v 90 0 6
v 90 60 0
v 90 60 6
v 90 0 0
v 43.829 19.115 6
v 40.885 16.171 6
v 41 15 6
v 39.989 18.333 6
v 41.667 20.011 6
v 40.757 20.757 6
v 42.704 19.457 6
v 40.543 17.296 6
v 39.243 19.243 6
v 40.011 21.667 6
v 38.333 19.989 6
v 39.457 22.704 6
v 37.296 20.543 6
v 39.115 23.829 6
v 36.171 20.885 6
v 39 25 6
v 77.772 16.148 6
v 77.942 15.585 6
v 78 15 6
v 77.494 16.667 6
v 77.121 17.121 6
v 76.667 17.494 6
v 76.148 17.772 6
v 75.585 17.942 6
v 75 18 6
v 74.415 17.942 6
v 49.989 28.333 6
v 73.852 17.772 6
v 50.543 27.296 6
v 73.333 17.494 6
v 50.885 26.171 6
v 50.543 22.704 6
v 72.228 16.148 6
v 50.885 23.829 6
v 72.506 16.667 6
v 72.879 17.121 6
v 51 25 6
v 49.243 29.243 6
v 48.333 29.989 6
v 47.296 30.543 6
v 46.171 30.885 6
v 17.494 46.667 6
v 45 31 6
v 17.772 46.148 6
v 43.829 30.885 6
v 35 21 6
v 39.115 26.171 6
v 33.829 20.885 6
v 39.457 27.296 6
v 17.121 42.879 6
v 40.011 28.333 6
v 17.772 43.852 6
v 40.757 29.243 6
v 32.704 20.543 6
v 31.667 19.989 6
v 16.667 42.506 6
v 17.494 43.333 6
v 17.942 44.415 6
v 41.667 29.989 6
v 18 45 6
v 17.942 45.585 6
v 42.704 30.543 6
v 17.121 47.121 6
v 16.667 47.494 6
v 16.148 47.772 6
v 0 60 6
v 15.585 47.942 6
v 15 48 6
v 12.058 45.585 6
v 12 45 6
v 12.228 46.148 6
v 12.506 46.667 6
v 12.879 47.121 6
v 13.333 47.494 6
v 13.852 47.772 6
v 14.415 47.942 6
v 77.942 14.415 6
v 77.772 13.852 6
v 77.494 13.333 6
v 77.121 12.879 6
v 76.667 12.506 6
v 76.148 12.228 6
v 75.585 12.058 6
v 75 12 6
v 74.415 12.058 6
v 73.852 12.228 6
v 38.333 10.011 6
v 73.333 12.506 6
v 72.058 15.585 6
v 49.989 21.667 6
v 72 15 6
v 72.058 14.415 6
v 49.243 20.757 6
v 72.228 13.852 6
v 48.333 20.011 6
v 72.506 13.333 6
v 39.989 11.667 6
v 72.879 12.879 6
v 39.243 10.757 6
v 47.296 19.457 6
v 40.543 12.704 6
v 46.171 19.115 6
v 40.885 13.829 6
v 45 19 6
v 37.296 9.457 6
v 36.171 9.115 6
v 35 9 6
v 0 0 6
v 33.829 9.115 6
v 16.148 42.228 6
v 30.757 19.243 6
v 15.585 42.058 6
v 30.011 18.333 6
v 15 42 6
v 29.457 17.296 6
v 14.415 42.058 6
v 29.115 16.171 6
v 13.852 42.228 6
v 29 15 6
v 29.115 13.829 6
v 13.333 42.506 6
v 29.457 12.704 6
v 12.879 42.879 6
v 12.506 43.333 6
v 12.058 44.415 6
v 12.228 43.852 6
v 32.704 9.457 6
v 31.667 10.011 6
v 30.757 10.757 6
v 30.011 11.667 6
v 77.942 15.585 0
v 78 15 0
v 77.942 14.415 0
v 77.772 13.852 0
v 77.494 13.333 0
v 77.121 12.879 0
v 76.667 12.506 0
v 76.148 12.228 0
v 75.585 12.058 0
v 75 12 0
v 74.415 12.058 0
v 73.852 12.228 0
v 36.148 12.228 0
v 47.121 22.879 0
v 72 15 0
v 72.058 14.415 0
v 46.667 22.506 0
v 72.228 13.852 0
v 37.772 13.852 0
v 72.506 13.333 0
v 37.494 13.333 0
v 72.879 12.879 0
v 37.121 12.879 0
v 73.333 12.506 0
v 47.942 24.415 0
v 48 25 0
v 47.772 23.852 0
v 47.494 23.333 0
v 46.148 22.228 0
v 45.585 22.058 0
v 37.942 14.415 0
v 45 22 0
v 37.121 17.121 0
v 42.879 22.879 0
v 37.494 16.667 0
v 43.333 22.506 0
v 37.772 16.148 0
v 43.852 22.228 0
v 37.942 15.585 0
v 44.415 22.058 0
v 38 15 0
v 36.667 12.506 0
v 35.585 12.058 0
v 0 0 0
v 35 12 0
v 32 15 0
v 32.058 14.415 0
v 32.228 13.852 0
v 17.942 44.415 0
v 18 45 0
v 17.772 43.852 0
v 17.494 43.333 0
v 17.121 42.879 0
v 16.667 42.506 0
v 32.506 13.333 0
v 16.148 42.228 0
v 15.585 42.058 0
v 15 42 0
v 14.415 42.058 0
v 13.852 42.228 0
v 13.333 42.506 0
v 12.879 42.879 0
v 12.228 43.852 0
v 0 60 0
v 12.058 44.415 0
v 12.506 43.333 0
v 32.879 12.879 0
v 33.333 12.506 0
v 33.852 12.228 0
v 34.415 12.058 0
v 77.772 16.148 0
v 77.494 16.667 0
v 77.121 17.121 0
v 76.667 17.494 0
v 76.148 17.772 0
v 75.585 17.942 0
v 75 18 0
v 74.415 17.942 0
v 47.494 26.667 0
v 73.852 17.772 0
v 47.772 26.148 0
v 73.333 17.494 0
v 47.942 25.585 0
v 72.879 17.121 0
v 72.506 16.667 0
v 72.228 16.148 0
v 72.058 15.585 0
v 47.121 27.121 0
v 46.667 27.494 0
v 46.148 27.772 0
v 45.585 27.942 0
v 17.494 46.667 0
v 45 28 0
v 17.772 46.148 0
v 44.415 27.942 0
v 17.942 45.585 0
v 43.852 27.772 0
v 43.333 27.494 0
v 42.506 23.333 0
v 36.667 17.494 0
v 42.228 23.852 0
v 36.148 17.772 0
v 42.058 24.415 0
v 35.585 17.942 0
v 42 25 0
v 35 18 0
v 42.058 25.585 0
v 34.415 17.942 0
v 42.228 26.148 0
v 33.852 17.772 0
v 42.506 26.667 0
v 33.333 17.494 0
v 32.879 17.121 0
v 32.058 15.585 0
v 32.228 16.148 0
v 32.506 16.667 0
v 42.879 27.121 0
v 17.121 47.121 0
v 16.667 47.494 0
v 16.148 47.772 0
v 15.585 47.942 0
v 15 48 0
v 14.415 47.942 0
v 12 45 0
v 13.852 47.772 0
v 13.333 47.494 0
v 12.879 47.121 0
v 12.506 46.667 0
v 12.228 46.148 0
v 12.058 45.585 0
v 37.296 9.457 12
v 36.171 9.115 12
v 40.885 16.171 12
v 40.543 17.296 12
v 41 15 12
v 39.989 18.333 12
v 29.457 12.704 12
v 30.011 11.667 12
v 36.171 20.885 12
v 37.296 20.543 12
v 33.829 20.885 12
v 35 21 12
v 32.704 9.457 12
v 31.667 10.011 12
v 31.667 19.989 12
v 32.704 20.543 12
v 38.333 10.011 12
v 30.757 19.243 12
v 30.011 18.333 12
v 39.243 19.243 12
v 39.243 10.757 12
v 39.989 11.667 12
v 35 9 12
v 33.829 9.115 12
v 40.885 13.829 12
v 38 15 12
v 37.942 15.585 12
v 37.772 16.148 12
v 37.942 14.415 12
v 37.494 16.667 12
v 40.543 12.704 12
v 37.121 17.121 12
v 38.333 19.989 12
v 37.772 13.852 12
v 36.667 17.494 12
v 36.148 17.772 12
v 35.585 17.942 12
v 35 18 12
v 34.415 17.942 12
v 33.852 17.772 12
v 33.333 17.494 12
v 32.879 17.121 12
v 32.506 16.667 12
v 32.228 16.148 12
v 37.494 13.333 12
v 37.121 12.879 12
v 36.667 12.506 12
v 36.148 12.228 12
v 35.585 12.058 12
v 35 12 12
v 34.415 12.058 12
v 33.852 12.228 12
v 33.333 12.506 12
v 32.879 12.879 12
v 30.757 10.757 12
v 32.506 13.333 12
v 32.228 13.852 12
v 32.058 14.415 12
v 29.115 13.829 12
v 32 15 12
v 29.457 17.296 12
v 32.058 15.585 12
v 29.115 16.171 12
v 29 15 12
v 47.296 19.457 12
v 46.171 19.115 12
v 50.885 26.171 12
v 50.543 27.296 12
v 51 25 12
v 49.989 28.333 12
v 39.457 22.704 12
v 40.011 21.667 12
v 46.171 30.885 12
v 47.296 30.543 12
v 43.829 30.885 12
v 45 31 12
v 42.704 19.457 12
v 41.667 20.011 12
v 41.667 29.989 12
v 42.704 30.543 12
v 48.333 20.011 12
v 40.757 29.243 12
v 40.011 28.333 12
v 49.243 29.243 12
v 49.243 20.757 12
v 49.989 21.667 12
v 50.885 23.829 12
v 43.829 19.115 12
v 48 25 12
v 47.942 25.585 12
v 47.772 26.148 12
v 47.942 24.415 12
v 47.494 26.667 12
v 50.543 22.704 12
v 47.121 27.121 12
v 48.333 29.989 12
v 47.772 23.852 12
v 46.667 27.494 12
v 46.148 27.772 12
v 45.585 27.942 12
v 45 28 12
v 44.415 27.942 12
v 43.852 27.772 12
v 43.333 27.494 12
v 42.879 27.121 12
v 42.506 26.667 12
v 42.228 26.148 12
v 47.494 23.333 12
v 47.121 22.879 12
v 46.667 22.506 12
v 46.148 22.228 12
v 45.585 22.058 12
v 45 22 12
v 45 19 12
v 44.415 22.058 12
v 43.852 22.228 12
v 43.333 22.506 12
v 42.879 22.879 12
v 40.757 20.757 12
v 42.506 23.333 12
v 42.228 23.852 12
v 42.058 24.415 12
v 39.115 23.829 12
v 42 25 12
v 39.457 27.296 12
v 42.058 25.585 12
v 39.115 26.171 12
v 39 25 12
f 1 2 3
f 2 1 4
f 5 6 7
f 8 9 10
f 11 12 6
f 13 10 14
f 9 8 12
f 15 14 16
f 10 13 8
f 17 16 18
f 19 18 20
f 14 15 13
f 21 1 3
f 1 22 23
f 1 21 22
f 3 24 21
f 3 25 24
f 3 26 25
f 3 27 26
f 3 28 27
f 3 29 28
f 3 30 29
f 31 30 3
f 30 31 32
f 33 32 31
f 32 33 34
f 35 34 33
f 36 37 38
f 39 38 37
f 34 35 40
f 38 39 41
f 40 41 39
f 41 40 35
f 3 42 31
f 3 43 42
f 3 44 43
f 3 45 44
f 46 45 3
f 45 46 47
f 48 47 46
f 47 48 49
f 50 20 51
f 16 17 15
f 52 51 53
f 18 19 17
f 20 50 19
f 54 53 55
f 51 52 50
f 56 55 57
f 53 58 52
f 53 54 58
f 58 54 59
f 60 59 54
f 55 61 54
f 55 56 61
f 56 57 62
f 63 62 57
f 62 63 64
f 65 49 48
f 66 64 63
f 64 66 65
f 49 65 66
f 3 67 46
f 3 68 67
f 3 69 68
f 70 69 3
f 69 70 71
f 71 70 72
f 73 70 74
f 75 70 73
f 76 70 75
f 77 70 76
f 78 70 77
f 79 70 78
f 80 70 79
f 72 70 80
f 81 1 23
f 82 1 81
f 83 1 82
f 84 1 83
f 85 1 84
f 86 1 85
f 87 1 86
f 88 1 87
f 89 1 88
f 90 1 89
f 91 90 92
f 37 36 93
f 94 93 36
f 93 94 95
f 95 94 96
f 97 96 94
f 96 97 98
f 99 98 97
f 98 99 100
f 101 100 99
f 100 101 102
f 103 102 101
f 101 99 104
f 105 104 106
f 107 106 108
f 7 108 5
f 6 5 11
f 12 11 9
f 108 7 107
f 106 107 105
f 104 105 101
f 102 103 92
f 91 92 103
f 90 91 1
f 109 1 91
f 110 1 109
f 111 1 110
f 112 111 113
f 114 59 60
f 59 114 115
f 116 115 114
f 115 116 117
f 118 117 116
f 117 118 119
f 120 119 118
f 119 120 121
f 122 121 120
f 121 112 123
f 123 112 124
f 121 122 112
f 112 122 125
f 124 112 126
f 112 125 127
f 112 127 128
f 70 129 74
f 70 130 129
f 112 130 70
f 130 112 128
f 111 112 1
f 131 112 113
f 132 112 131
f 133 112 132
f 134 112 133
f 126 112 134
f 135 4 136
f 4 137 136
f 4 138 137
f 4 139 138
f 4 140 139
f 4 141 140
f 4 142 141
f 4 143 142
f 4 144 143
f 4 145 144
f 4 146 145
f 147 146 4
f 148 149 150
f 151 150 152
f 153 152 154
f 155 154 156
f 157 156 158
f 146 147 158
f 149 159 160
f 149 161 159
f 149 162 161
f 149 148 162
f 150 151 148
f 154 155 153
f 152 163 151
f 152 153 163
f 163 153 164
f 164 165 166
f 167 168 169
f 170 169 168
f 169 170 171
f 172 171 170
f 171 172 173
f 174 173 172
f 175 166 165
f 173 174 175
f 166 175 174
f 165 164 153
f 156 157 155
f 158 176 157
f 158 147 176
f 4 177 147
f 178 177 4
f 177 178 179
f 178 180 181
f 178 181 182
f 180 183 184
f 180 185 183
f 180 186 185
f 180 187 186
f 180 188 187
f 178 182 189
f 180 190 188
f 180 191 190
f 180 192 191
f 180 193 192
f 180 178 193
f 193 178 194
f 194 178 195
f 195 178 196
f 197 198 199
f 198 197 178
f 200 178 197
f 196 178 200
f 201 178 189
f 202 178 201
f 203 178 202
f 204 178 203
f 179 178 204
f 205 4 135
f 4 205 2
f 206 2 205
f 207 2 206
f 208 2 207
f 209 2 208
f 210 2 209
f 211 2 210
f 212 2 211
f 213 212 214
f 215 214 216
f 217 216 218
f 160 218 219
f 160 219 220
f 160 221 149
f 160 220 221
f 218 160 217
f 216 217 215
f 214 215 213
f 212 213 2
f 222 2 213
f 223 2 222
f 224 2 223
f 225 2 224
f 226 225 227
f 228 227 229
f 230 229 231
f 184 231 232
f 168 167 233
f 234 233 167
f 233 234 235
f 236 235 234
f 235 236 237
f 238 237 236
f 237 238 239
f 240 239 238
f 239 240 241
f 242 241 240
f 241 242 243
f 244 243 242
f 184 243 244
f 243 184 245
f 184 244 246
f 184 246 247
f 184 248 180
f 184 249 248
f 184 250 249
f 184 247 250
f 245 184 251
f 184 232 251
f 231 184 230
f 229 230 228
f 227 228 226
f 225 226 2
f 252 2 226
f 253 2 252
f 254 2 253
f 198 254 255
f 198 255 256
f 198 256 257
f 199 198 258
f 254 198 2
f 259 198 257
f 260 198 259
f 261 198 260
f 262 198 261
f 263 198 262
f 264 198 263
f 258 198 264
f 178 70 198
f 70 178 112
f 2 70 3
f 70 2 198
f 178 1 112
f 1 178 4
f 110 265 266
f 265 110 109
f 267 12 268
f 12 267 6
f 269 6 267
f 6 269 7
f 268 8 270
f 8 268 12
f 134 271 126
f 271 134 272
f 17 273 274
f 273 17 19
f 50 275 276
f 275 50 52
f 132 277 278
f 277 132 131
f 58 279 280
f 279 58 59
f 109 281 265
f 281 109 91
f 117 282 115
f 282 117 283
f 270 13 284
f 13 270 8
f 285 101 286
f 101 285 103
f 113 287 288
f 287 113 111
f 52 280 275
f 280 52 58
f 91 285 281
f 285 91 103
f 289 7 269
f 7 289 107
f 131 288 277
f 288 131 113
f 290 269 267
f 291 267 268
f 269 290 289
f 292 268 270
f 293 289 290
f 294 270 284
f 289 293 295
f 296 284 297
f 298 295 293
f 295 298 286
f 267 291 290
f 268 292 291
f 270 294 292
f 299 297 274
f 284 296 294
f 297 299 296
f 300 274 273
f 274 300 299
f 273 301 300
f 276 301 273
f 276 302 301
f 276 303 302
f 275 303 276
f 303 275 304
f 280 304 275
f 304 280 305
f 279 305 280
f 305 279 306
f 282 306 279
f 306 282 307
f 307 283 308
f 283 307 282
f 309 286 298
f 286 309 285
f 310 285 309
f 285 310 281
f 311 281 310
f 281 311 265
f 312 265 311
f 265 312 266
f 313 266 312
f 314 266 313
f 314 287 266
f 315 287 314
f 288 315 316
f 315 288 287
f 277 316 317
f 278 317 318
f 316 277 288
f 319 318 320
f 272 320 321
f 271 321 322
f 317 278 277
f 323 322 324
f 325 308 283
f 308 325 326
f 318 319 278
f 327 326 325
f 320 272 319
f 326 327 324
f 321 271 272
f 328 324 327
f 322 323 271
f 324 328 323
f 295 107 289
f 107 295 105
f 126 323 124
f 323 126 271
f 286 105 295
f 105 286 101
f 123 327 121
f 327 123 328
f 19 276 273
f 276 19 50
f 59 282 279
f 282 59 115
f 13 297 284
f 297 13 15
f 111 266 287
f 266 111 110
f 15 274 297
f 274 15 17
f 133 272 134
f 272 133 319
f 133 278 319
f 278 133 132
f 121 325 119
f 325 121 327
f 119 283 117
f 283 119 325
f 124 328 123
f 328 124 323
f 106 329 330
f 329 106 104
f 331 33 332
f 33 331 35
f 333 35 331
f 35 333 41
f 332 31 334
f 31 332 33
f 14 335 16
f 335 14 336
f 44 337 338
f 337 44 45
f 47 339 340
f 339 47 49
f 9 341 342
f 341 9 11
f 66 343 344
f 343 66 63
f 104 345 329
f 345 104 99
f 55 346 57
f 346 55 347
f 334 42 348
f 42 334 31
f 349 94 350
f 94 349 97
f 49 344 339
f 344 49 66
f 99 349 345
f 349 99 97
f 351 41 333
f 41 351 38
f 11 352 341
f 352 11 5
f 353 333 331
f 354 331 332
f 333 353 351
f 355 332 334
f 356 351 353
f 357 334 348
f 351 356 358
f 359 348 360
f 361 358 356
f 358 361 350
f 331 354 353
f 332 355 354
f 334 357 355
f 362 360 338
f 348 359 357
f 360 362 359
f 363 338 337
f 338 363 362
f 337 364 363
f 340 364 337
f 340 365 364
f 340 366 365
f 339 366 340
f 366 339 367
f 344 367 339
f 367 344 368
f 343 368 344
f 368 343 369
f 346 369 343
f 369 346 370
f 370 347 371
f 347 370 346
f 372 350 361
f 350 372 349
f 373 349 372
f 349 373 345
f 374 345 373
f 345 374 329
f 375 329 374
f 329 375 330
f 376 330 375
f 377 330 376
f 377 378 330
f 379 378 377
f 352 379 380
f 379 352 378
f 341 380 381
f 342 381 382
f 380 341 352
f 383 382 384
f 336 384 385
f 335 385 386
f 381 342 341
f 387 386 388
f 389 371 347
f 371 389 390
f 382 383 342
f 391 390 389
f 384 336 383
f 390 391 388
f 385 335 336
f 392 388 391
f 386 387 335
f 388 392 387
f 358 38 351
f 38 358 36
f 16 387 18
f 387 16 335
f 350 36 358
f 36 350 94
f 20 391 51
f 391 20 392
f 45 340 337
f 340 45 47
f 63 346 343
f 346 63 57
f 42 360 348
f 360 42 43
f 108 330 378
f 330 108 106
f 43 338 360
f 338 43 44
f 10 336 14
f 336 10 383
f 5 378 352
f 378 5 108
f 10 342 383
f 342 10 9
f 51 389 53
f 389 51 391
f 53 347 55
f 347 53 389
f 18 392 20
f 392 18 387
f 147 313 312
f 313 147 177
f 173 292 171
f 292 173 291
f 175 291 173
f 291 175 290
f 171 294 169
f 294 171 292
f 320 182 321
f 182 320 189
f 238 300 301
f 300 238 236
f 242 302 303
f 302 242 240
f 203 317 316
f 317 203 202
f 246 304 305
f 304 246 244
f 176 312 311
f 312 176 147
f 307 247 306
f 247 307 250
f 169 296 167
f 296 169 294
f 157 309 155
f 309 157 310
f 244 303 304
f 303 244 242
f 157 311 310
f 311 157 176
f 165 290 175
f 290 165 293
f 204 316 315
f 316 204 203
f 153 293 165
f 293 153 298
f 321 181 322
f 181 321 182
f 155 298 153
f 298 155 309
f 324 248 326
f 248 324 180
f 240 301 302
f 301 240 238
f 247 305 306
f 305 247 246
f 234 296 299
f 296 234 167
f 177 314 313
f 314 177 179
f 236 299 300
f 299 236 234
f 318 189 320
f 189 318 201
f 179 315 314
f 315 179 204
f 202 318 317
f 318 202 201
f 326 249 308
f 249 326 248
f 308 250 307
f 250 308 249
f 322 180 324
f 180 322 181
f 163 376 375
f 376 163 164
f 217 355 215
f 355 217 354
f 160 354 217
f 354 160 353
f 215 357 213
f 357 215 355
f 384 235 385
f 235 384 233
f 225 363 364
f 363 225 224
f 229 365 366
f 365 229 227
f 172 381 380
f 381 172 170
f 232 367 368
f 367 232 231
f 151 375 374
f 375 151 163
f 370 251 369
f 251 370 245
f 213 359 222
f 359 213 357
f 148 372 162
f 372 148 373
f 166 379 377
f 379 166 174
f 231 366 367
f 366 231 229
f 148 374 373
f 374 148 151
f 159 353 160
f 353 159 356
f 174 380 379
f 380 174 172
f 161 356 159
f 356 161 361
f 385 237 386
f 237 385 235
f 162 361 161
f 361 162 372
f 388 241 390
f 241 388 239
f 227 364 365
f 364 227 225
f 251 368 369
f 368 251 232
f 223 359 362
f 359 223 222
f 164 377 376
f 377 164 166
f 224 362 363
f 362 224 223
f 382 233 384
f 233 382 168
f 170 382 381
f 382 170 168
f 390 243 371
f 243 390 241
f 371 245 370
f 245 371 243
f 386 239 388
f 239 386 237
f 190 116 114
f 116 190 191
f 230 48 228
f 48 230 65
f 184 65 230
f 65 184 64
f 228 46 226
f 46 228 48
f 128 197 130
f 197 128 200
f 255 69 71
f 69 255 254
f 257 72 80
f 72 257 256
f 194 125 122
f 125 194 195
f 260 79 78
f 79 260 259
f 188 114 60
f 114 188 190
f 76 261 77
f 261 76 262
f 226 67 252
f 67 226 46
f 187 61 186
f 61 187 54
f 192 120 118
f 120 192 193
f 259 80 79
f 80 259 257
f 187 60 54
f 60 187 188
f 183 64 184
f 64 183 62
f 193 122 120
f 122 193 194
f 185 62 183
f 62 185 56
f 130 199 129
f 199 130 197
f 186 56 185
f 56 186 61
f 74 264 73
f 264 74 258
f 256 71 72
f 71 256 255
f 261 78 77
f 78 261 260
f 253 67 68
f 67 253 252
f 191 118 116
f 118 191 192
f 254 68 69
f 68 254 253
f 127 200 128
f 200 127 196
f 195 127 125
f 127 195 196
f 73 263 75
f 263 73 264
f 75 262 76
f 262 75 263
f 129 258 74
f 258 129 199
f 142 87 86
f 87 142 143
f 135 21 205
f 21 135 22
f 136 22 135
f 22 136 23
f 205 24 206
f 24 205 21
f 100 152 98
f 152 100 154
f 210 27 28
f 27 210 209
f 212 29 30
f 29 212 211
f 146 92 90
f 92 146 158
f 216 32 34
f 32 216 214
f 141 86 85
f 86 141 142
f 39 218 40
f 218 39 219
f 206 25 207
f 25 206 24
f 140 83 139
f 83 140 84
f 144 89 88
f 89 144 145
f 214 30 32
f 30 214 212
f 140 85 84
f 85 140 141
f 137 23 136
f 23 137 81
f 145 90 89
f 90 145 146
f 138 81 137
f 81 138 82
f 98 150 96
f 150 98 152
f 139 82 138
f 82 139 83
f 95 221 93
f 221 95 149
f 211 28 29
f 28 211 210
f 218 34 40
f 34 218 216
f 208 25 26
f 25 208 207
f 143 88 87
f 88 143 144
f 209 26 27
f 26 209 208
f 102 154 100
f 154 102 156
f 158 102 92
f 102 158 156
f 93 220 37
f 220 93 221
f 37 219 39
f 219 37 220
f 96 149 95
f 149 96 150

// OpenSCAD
$fn = 32;

// ----------------------------------------------------------------------
// Mixed field: bosses and holes at given coordinates
// ----------------------------------------------------------------------

// --- parameters (mm) ---
plate_l = 90;             // plate length, X
plate_w = 60;             // plate width, Y
plate_t = 6;              // plate thickness, Z
boss_d = 12;              // boss diameter
boss_h = 6;               // boss height above the plate
hole_d = 6;               // through hole diameter

total_h = plate_t + boss_h;  // overall height

difference() {
  union() {
    cube([plate_l, plate_w, plate_t]);
    translate([35, 15, plate_t]) cylinder(h = boss_h, d = boss_d);
    translate([45, 25, plate_t]) cylinder(h = boss_h, d = boss_d);
  }
  translate([35, 15, -1]) cylinder(h = total_h + 2, d = boss_d / 2);
  translate([45, 25, -1]) cylinder(h = total_h + 2, d = boss_d / 2);
  translate([15, 45, -1]) cylinder(h = plate_t + 2, d = hole_d);
  translate([75, 15, -1]) cylinder(h = plate_t + 2, d = hole_d);
}
